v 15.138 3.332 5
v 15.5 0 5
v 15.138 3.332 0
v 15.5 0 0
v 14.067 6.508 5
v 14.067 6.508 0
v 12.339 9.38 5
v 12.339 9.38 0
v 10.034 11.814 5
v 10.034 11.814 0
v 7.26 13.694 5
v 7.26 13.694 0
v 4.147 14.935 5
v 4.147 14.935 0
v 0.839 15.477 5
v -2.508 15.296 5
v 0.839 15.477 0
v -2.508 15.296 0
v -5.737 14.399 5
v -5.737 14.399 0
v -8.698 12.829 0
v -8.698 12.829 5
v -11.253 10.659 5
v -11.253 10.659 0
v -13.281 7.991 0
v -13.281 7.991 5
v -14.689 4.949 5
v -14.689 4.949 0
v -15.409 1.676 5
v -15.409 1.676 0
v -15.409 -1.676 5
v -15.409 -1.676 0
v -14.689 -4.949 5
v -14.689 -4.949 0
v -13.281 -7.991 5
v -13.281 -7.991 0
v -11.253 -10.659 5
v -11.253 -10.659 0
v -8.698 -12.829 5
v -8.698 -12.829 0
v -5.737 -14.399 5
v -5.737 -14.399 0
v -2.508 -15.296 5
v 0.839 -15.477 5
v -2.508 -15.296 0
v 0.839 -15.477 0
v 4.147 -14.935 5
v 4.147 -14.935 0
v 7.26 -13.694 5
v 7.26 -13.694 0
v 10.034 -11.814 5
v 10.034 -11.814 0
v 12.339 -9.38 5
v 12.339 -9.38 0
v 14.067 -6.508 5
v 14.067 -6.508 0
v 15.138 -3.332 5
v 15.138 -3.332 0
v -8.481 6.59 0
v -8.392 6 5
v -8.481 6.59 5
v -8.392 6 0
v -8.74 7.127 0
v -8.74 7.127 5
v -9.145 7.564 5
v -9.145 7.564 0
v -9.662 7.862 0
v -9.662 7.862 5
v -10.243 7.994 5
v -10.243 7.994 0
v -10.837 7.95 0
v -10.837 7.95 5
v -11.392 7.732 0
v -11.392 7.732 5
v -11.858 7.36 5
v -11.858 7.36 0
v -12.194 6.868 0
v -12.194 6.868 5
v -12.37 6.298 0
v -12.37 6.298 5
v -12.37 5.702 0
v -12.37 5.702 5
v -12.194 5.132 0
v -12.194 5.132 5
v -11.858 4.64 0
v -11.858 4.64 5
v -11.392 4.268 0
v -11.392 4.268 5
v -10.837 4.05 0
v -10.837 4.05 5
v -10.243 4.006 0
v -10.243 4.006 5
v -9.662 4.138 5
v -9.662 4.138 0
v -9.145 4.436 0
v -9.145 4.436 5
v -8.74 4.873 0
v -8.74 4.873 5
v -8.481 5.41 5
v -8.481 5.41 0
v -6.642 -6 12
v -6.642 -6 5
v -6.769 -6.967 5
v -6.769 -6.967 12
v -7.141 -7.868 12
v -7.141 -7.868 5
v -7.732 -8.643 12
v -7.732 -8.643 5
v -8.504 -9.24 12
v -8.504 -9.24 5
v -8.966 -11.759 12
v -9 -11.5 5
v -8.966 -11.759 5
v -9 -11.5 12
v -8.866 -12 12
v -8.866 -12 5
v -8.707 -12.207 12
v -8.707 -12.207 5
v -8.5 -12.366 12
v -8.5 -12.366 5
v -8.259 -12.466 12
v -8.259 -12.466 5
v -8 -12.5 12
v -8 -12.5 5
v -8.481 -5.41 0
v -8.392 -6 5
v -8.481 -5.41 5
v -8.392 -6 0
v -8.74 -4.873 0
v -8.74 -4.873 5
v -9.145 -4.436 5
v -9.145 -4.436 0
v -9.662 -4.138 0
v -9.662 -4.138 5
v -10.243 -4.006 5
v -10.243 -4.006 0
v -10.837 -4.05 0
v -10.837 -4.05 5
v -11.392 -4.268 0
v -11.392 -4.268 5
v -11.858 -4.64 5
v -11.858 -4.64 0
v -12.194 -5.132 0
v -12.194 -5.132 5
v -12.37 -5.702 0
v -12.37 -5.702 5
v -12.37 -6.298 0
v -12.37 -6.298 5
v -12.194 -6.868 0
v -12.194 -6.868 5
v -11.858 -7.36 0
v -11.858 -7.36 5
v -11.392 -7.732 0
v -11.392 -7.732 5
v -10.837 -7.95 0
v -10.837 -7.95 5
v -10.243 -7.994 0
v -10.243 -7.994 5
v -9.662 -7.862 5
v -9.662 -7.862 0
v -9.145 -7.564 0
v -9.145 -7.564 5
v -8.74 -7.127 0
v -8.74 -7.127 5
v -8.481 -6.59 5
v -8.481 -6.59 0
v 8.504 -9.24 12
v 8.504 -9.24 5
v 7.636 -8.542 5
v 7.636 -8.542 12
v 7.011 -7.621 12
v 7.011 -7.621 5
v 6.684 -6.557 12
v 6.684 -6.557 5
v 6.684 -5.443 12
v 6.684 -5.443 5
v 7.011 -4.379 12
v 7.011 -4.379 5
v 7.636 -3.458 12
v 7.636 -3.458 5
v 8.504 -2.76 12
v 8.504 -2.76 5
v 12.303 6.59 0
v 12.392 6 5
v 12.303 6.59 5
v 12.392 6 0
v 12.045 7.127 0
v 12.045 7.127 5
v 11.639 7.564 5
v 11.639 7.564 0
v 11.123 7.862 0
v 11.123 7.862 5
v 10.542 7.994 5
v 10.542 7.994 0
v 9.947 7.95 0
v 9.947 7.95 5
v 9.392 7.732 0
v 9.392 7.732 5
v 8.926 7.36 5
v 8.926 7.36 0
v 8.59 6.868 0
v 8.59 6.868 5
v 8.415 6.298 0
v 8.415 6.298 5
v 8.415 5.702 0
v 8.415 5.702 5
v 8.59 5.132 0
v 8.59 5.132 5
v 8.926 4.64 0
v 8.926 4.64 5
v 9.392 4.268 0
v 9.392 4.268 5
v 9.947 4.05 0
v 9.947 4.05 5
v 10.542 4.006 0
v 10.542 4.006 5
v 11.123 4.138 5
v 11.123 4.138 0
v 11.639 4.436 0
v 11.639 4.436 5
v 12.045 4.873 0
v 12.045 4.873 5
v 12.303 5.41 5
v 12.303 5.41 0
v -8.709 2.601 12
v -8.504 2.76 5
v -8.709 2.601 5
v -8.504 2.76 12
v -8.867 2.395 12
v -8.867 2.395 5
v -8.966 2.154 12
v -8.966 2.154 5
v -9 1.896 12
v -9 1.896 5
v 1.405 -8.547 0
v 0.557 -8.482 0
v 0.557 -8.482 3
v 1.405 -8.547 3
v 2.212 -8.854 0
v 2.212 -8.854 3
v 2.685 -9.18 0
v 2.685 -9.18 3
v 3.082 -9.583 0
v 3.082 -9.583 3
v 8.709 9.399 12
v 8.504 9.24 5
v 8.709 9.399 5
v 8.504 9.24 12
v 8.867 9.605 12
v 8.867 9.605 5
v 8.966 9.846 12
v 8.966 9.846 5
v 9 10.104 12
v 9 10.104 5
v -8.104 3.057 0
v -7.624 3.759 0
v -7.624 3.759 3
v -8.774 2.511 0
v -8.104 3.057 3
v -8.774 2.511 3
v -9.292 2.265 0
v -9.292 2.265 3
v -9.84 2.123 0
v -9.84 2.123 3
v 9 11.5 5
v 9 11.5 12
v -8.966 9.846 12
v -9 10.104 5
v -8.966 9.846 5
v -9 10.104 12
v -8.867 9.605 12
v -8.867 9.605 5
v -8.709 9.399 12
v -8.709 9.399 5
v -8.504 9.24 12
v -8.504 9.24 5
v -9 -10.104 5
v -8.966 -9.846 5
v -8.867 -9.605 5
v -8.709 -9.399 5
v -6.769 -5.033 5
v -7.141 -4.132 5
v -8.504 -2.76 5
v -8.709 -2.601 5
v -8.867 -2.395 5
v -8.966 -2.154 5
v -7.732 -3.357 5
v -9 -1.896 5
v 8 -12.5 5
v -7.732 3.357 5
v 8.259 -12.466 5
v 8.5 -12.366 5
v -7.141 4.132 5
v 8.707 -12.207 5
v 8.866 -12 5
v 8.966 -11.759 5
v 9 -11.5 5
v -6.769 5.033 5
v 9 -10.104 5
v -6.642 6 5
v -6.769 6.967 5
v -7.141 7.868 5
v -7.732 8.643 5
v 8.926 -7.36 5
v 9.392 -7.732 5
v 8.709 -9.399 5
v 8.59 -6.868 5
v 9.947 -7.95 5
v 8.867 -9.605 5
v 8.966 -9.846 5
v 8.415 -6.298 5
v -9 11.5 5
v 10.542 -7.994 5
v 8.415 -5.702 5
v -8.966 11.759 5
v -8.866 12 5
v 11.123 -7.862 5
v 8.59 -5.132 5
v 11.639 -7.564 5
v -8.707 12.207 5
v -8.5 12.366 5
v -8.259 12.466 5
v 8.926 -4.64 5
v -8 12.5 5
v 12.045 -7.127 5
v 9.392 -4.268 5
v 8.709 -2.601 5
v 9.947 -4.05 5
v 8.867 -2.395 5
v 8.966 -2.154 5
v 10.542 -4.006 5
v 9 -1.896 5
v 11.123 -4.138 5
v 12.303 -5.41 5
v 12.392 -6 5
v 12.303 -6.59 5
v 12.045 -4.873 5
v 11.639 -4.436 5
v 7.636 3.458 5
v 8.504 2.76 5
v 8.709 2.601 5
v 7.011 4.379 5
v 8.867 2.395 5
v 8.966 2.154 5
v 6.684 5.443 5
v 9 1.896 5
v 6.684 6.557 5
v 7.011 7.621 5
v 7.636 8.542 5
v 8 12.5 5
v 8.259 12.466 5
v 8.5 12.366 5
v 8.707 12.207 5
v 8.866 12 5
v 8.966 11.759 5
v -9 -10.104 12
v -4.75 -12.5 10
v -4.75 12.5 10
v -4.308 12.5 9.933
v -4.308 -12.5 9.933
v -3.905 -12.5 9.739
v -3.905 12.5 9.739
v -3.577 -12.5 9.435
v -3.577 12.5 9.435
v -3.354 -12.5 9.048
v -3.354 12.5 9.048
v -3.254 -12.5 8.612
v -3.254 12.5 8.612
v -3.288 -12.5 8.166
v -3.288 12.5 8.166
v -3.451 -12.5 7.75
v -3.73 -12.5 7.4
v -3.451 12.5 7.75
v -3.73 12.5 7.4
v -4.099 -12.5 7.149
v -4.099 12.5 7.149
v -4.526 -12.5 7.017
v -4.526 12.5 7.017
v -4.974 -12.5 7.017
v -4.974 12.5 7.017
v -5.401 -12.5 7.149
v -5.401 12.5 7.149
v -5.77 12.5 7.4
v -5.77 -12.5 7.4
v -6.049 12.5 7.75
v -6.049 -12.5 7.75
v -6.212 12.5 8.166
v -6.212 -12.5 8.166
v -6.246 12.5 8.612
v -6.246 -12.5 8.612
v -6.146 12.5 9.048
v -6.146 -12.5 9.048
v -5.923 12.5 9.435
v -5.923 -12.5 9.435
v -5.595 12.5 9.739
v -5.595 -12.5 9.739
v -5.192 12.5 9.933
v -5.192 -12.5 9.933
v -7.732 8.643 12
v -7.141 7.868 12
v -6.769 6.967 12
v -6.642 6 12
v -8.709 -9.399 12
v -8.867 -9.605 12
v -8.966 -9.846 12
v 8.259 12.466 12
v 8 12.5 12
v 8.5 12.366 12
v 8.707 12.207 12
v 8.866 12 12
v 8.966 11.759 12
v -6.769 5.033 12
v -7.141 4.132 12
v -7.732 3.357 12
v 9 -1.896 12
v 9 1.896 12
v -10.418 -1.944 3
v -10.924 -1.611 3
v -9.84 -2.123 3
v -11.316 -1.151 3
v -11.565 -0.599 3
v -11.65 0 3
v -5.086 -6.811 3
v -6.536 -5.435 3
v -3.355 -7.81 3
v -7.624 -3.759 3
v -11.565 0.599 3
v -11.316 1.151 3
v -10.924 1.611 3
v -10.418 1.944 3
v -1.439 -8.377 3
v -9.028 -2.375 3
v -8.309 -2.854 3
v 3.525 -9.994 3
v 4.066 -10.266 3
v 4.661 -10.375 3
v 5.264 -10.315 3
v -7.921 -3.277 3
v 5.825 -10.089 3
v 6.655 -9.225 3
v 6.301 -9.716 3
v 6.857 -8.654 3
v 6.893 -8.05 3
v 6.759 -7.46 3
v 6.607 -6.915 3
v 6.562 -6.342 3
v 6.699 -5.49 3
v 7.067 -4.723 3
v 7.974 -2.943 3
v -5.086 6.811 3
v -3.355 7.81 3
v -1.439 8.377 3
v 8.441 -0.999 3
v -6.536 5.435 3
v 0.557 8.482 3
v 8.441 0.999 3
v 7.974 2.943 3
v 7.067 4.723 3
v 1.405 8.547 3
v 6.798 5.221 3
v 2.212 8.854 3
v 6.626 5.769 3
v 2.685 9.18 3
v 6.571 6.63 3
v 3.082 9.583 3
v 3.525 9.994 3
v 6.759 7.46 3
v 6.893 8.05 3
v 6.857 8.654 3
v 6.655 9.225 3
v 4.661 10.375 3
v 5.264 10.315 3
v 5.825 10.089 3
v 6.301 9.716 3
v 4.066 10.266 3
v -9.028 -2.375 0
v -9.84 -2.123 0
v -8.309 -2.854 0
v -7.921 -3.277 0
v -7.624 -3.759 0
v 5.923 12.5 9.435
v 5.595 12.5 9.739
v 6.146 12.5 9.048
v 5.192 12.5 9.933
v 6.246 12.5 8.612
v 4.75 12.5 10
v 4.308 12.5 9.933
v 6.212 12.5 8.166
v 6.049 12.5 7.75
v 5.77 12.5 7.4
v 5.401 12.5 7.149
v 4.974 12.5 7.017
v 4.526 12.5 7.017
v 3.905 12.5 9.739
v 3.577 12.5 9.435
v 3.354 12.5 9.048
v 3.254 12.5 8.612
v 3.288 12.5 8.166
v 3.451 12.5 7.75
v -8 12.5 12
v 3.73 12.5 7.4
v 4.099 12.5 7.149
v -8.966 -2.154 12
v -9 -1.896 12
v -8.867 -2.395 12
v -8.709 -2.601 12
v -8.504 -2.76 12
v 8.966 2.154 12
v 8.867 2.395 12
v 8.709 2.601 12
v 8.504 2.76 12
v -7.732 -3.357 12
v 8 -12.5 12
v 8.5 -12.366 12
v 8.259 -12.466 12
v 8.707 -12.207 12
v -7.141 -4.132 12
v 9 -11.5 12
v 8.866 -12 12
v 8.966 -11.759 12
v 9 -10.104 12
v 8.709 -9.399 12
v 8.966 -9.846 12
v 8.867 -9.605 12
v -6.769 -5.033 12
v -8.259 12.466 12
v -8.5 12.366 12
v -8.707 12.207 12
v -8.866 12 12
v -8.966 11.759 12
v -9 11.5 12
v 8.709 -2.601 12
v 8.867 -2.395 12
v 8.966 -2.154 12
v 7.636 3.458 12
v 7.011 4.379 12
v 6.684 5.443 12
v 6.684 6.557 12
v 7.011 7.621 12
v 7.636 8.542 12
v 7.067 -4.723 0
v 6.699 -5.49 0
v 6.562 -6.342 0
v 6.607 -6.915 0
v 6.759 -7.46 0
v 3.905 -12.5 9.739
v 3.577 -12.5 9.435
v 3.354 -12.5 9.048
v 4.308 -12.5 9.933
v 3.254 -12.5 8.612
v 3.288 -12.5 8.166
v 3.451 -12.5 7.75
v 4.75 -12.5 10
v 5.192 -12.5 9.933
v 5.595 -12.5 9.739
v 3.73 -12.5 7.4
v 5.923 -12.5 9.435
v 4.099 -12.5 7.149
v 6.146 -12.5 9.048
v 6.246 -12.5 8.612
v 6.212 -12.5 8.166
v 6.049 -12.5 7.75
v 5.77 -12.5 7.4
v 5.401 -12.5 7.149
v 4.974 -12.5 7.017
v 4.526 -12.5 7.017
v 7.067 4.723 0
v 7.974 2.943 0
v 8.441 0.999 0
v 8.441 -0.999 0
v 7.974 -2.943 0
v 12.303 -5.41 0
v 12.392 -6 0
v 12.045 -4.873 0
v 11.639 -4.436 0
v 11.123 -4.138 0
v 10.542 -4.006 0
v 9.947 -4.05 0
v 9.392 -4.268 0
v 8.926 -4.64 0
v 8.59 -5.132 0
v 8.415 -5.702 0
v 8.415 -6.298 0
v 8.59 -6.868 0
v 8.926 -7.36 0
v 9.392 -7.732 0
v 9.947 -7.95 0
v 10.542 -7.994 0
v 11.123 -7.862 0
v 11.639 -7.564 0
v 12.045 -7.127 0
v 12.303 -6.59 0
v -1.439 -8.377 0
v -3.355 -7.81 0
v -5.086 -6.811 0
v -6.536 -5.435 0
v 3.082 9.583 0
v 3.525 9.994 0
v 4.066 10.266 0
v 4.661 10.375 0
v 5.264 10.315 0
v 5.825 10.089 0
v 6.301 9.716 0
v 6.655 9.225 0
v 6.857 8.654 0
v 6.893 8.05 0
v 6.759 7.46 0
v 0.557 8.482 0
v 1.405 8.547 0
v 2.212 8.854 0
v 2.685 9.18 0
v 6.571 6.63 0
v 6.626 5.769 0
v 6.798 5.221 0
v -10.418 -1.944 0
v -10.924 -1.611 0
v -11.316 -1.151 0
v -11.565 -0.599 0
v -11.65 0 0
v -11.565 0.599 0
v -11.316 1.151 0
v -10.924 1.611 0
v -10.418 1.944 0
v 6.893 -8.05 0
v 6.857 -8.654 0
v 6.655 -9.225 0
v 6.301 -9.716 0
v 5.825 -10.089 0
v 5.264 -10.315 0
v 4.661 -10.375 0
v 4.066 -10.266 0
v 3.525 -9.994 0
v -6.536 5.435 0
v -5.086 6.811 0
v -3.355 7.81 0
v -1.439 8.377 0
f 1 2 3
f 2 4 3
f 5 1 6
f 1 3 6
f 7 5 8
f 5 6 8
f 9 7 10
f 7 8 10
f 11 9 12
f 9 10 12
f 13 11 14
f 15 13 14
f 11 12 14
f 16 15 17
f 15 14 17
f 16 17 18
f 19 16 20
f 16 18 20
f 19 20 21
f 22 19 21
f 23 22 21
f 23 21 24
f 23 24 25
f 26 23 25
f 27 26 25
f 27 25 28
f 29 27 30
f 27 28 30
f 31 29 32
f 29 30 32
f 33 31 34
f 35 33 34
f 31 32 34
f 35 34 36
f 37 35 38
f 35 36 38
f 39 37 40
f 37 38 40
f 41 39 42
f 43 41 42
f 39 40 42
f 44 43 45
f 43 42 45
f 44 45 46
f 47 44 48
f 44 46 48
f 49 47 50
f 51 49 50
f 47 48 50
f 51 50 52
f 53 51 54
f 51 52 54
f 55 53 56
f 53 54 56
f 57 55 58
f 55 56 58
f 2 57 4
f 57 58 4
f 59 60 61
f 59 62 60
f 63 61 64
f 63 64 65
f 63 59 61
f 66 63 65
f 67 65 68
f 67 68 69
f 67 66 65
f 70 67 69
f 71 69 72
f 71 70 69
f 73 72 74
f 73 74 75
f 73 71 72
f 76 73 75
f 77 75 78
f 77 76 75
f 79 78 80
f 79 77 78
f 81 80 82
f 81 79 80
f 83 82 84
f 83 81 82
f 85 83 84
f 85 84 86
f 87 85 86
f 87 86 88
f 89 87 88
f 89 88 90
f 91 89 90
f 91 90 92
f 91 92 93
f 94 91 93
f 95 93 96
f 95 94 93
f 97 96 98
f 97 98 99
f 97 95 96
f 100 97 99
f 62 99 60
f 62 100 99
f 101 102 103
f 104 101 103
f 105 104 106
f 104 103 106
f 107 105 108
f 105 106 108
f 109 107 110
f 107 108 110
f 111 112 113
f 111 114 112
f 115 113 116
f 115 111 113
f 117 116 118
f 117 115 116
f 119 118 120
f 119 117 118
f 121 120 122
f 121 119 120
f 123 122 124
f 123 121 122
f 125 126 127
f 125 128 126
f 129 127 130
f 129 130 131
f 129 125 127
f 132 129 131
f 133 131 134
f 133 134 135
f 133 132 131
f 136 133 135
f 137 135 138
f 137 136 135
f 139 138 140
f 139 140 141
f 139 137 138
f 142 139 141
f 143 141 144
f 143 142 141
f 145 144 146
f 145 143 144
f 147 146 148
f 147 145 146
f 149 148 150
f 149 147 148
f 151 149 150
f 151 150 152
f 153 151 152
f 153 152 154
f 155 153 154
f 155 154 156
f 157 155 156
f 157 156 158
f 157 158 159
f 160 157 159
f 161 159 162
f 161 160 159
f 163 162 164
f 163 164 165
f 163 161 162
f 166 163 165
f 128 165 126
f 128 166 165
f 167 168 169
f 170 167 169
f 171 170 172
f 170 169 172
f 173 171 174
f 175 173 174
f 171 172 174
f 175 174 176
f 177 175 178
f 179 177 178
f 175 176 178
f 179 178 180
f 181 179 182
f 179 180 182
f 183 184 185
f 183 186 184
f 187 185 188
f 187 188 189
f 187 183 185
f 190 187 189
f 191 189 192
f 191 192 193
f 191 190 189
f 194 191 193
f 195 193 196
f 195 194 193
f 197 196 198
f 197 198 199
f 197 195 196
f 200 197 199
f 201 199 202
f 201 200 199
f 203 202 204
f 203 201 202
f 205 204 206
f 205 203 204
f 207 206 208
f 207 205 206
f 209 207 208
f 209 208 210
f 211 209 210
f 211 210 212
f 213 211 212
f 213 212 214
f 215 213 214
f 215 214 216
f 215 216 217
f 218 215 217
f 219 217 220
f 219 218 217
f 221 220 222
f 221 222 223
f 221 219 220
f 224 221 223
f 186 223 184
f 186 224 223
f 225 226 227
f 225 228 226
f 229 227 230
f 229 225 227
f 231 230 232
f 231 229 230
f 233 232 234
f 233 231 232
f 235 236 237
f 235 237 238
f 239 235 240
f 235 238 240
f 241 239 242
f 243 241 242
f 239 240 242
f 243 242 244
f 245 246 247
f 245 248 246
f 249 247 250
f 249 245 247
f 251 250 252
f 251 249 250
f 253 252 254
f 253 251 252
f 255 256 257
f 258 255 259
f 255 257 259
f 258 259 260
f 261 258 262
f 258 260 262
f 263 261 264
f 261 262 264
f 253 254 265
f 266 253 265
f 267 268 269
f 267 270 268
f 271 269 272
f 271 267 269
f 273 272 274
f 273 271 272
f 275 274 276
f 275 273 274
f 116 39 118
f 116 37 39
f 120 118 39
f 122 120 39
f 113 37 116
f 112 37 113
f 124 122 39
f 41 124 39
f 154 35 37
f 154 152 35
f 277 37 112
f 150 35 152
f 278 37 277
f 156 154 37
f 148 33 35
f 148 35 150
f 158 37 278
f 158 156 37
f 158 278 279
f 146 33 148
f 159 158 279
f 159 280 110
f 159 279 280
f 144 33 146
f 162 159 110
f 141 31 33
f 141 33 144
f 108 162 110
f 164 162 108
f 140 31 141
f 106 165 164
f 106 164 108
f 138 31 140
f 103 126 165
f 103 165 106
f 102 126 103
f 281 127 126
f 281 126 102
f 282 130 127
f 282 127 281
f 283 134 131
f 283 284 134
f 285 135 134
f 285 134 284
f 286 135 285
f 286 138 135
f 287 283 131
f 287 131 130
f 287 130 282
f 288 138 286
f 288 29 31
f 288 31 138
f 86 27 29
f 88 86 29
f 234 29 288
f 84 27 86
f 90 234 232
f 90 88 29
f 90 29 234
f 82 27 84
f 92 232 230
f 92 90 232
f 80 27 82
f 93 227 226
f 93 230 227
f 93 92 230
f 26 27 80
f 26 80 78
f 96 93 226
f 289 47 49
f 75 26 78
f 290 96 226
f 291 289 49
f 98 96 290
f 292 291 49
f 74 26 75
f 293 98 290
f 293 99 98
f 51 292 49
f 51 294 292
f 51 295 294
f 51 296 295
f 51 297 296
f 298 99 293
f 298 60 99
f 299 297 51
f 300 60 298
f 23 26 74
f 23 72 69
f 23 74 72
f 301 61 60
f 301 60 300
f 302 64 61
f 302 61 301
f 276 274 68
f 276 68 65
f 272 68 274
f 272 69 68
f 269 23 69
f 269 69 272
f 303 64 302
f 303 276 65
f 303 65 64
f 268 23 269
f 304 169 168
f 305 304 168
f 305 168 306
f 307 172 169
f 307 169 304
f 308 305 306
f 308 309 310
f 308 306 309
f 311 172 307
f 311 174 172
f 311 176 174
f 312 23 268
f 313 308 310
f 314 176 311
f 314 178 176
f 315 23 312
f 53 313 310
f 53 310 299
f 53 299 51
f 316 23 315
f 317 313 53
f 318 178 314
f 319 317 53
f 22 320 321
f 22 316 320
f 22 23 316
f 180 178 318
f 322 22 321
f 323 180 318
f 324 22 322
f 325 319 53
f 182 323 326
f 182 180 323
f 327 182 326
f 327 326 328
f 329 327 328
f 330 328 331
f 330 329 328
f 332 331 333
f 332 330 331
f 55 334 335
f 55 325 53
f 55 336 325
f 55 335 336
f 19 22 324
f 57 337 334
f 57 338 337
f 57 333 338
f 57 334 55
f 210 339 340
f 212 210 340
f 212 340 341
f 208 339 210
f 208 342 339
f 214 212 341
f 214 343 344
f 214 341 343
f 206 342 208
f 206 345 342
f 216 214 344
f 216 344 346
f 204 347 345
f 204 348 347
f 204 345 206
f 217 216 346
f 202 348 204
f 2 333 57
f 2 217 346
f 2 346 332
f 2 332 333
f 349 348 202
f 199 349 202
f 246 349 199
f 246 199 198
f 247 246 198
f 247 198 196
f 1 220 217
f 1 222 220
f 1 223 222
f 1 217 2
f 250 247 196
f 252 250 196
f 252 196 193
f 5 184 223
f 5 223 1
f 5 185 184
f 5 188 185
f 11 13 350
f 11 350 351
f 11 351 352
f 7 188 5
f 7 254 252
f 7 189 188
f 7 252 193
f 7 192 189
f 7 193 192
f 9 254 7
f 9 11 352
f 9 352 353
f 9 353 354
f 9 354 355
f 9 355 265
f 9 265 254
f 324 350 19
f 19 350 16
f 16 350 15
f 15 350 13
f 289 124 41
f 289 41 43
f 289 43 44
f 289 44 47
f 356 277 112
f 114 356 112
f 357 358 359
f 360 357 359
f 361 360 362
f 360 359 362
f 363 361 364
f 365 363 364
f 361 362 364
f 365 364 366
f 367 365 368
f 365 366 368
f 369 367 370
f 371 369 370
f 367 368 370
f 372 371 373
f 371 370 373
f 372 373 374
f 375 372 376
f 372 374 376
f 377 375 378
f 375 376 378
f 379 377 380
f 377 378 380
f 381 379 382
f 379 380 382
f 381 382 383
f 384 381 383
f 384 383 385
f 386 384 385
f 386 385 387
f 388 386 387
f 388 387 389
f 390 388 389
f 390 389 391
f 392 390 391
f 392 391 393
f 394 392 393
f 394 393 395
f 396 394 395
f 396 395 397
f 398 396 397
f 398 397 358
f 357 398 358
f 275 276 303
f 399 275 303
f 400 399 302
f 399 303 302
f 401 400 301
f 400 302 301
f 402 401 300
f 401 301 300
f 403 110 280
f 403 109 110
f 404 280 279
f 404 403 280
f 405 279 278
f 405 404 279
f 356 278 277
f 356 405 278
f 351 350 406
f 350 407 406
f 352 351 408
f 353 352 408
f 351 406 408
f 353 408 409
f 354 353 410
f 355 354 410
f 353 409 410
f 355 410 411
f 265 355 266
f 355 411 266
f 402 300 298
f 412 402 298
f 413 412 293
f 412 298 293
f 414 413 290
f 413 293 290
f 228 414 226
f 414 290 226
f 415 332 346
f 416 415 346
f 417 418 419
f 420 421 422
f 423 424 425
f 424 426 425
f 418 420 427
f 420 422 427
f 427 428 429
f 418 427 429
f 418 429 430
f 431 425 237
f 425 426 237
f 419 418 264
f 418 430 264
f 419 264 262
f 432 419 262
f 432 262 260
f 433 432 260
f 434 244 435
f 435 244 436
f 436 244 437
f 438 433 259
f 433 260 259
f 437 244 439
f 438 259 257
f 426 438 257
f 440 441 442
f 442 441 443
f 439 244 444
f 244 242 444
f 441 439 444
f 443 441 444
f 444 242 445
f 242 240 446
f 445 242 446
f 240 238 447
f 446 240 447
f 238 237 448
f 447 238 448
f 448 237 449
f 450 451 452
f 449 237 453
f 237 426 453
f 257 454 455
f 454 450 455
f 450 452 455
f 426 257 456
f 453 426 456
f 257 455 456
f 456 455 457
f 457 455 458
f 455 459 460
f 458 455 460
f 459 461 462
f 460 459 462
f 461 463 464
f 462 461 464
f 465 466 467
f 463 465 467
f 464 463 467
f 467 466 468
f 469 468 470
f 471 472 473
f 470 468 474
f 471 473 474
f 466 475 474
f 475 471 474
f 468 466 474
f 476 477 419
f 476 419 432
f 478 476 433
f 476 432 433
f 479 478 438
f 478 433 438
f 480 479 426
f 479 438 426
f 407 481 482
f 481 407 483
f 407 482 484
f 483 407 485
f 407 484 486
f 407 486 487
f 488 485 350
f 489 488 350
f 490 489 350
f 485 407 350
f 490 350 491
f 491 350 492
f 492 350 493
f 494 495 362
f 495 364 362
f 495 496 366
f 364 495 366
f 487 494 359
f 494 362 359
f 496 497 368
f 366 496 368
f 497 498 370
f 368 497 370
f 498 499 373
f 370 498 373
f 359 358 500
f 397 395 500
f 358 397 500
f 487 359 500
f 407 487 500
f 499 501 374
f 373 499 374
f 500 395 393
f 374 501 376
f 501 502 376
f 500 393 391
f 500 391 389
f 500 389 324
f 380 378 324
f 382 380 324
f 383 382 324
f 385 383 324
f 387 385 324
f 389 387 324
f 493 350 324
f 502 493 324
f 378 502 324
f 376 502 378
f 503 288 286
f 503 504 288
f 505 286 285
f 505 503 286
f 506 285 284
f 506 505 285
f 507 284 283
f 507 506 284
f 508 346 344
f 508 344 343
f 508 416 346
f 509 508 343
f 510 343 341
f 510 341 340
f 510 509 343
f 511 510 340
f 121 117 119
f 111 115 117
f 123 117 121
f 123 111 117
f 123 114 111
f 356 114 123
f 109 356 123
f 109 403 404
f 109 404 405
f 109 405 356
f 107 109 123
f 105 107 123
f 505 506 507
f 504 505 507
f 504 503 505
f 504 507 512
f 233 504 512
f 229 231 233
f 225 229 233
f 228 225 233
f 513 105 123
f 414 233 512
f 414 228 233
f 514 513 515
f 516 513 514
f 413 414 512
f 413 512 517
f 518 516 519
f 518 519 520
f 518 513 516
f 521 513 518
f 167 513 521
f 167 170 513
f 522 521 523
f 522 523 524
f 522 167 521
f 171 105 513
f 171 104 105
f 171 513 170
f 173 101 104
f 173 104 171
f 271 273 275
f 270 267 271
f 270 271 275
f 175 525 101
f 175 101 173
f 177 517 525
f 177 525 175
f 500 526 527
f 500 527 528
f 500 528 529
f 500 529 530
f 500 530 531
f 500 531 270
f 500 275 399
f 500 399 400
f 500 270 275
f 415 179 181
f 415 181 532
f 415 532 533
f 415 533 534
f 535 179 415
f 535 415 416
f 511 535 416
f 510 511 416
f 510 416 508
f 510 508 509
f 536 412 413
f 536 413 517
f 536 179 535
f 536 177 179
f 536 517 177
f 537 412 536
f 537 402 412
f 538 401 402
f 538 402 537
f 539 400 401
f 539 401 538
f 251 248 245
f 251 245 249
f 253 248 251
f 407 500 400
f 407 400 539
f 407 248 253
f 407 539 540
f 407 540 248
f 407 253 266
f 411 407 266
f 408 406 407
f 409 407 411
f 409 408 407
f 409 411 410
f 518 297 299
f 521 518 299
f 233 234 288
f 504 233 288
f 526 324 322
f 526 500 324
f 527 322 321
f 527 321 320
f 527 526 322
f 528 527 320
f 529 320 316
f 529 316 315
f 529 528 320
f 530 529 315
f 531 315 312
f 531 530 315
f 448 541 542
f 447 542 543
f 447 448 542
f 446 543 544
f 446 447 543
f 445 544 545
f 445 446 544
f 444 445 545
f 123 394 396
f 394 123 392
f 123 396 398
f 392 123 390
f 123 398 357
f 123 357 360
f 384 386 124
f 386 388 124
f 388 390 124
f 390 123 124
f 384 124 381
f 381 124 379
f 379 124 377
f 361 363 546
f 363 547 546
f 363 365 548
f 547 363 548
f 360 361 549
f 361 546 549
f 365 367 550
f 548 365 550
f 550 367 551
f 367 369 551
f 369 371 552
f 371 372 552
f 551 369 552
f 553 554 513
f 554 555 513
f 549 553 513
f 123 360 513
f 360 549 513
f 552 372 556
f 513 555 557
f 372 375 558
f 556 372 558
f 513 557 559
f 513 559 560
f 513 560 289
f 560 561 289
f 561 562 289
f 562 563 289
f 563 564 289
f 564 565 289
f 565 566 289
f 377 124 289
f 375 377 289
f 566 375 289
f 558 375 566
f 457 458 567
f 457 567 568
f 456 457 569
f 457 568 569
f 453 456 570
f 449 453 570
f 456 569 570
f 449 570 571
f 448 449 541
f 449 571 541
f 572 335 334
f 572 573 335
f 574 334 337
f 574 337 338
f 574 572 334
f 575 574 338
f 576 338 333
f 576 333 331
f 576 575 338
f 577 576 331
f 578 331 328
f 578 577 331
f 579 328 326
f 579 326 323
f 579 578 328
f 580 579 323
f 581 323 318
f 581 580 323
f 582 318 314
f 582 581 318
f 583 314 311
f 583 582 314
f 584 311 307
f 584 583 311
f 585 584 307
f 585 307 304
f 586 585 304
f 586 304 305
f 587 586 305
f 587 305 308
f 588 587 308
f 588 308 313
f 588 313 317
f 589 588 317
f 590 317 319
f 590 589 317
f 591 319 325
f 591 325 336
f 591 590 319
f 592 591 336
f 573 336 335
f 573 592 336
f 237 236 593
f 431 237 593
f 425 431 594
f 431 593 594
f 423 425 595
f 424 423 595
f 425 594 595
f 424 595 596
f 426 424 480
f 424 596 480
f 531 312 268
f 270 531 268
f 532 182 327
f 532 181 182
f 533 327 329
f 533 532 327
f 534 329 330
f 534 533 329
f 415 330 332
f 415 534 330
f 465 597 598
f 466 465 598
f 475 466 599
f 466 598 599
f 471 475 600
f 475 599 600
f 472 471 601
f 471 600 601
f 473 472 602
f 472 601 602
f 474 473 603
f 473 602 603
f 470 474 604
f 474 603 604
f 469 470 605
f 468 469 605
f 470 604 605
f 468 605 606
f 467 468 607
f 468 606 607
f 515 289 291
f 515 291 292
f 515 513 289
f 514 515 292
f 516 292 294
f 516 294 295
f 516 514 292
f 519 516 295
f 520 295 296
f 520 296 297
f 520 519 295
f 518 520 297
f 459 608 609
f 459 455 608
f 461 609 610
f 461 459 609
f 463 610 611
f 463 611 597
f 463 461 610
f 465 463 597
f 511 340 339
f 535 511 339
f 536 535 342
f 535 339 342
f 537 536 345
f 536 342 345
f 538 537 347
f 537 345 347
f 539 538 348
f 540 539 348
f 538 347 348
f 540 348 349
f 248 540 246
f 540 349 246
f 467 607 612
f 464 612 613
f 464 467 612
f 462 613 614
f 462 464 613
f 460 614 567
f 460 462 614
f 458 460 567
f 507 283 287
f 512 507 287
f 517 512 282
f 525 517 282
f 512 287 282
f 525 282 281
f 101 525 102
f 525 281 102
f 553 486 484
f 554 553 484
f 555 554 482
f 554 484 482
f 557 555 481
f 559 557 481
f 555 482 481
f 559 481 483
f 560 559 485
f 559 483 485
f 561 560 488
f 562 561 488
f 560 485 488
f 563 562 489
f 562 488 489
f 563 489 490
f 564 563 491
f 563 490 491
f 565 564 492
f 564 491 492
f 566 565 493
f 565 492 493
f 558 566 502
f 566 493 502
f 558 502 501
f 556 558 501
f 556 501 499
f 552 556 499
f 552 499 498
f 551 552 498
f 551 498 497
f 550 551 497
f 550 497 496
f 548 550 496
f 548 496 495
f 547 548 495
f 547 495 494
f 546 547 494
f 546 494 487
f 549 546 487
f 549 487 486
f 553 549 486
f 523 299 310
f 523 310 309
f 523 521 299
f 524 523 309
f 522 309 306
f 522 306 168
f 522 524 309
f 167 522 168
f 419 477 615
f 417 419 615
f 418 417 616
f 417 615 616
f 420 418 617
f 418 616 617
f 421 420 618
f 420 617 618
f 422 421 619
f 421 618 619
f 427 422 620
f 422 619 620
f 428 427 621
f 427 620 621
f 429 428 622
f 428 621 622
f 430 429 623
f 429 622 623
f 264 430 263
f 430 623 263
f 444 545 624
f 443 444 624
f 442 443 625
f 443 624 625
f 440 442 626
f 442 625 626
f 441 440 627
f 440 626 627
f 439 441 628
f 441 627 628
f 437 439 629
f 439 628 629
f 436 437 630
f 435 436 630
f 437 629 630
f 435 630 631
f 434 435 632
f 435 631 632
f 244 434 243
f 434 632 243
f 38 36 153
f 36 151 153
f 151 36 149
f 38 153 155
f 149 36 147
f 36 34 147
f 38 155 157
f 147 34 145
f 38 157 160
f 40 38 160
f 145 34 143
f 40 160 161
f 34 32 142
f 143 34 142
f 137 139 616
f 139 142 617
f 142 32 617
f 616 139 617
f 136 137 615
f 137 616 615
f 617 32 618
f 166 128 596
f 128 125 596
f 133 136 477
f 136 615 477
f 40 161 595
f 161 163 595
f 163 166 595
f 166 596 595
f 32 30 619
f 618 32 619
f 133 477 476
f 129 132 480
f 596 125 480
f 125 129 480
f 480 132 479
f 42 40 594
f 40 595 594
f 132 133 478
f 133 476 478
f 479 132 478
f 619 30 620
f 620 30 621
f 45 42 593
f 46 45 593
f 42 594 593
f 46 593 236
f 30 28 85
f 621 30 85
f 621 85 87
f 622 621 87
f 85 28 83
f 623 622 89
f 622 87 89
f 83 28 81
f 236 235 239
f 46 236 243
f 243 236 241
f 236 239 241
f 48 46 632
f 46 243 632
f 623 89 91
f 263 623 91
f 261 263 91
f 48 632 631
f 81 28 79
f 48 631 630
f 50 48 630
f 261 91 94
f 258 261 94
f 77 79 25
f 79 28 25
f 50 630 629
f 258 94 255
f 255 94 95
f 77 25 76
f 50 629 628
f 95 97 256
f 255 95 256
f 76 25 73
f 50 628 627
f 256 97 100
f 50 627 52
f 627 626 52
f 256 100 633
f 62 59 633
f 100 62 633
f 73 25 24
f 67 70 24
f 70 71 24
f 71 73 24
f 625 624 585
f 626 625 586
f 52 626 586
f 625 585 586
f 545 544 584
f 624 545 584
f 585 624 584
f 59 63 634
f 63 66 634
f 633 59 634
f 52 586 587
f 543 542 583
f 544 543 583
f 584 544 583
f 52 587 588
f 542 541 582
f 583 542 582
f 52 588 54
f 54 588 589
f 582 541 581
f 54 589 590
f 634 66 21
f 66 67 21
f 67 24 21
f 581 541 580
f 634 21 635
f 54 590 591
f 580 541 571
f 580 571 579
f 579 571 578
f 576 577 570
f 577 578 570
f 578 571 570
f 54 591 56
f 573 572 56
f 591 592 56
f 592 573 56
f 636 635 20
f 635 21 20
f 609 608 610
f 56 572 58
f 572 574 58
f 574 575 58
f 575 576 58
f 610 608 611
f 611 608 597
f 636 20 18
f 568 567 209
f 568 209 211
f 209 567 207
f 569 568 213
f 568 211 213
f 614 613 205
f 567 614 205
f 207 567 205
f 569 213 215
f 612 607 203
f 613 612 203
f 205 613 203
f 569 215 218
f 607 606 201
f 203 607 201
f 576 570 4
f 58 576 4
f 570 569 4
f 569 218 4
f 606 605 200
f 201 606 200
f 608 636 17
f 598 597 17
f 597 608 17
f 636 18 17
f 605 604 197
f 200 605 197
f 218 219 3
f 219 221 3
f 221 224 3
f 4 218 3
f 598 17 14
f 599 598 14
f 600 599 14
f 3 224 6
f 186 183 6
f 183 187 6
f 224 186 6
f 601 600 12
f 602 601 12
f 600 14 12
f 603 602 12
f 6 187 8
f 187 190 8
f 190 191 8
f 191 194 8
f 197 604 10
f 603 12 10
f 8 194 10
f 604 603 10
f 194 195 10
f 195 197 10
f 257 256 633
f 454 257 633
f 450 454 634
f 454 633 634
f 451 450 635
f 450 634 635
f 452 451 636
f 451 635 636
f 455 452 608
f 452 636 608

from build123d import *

# Parameters (mm, degrees)
SKETCH_1_R          = 15.5
SKETCH_1_R_2        = 2
EXTRUDE_1_DEPTH     = 3
FILLET_1_R          = 3
SKETCH_5_R          = 15.5
SKETCH_5_R_2        = 2
EXTRUDE_3_DEPTH     = 2
EXTRUDE_5_DEPTH     = 7
FILLET_4_R          = 1
SKETCH_8_R          = 1.5
CUT_EXTRUDE_3_DEPTH = 35.179672449


with BuildPart() as part:
    # 草图1 → 凸台-拉伸1 (new body)
    with BuildSketch(Plane.XY):
        Circle(SKETCH_1_R)
        with Locations((-10.392304845, -6)):
            Circle(SKETCH_1_R_2, mode=Mode.SUBTRACT)
        with Locations((10.392304845, -6)):
            Circle(SKETCH_1_R_2, mode=Mode.SUBTRACT)
        with Locations((-10.392304845, 6)):
            Circle(SKETCH_1_R_2, mode=Mode.SUBTRACT)
        with BuildLine():
            ThreePointArc((2.604308084, 8.091203829), (5.825, 10.089195954), (5.705034021, 6.300998875))
            ThreePointArc((5.705034021, 6.300998875), (8.5, 0), (5.705034021, -6.300998875))
            ThreePointArc((5.705034021, -6.300998875), (5.825, -10.089195954), (2.604308084, -8.091203829))
            ThreePointArc((2.604308084, -8.091203829), (-4.25, -7.361215932), (-8.309342105, -1.790204954))
            ThreePointArc((-8.309342105, -1.790204954), (-11.65, 0), (-8.309342105, 1.790204954))
            ThreePointArc((-8.309342105, 1.790204954), (-4.25, 7.361215932), (2.604308084, 8.091203829))
        make_face(mode=Mode.SUBTRACT)
        with Locations((10.392304845, 6)):
            Circle(SKETCH_1_R_2, mode=Mode.SUBTRACT)
    extrude(amount=EXTRUDE_1_DEPTH)

    # 圆角1
    fillet_1_edges = [part.edges().sort_by_distance(p)[0] for p in [
        (-8.309342105, 1.790204954, 1.5),
        (-8.309342105, -1.790204954, 1.5),
        (2.604308084, -8.091203829, 1.5),
        (5.705034021, -6.300998875, 1.5),
        (5.705034021, 6.300998875, 1.5),
        (2.604308084, 8.091203829, 1.5),
    ]]
    fillet(fillet_1_edges, radius=FILLET_1_R)

    # 草图5 → 凸台-拉伸3 (add)
    with BuildSketch(Plane.XY.offset(3)):
        Circle(SKETCH_5_R)
        with Locations((-10.392304845, -6)):
            Circle(SKETCH_5_R_2, mode=Mode.SUBTRACT)
        with Locations((10.392304845, -6)):
            Circle(SKETCH_5_R_2, mode=Mode.SUBTRACT)
        with Locations((10.392304845, 6)):
            Circle(SKETCH_5_R_2, mode=Mode.SUBTRACT)
        with Locations((-10.392304845, 6)):
            Circle(SKETCH_5_R_2, mode=Mode.SUBTRACT)
    extrude(amount=EXTRUDE_3_DEPTH)

    # 草图7 → 凸台-拉伸5 (add)
    with BuildSketch(Plane.XY.offset(5)):
        with BuildLine():
            Line((9, 12.5), (-9, 12.5))
            Line((-9, 12.5), (-9, 9.481951639))
            ThreePointArc((-9, 9.481951639), (-7.287176573, 8.102540942), (-6.642304845, 6))
            ThreePointArc((-6.642304845, 6), (-7.287176573, 3.897459058), (-9, 2.518048361))
            Line((-9, 2.518048361), (-9, -2.518048361))
            ThreePointArc((-9, -2.518048361), (-7.287176573, -3.897459058), (-6.642304845, -6))
            ThreePointArc((-6.642304845, -6), (-7.287176573, -8.102540942), (-9, -9.481951639))
            Line((-9, -9.481951639), (-9, -12.5))
            Line((-9, -12.5), (9, -12.5))
            Line((9, -12.5), (9, -9.481951639))
            ThreePointArc((9, -9.481951639), (6.642304845, -6), (9, -2.518048361))
            Line((9, -2.518048361), (9, 2.518048361))
            ThreePointArc((9, 2.518048361), (6.642304845, 6), (9, 9.481951639))
            Line((9, 9.481951639), (9, 12.5))
        make_face()
    extrude(amount=EXTRUDE_5_DEPTH)

    # 圆角4
    fillet_4_edges = [part.edges().sort_by_distance(p)[0] for p in [
        (9, -9.481951639, 8.5),
        (9, -2.518048361, 8.5),
        (9, 2.518048361, 8.5),
        (9, 9.481951639, 8.5),
        (9, 12.5, 8.5),
        (-9, 12.5, 8.5),
        (-9, 9.481951639, 8.5),
        (-9, 2.518048361, 8.5),
        (-9, -2.518048361, 8.5),
        (-9, -9.481951639, 8.5),
        (-9, -12.5, 8.5),
        (9, -12.5, 8.5),
    ]]
    fillet(fillet_4_edges, radius=FILLET_4_R)

    # 草图8 → 切除-拉伸3 (cut, through all)
    with BuildSketch(Plane(origin=(0, 12.5, 0), x_dir=(1, 0, 0), z_dir=(0, 1, 0))):
        with Locations(Location((-4.75, -8.5, 0), (0, 0, 270))):
            Circle(SKETCH_8_R)
        with Locations(Location((4.75, -8.5, 0), (0, 0, 270))):
            Circle(SKETCH_8_R)
    extrude(amount=-CUT_EXTRUDE_3_DEPTH, mode=Mode.SUBTRACT)


solid = part.part
